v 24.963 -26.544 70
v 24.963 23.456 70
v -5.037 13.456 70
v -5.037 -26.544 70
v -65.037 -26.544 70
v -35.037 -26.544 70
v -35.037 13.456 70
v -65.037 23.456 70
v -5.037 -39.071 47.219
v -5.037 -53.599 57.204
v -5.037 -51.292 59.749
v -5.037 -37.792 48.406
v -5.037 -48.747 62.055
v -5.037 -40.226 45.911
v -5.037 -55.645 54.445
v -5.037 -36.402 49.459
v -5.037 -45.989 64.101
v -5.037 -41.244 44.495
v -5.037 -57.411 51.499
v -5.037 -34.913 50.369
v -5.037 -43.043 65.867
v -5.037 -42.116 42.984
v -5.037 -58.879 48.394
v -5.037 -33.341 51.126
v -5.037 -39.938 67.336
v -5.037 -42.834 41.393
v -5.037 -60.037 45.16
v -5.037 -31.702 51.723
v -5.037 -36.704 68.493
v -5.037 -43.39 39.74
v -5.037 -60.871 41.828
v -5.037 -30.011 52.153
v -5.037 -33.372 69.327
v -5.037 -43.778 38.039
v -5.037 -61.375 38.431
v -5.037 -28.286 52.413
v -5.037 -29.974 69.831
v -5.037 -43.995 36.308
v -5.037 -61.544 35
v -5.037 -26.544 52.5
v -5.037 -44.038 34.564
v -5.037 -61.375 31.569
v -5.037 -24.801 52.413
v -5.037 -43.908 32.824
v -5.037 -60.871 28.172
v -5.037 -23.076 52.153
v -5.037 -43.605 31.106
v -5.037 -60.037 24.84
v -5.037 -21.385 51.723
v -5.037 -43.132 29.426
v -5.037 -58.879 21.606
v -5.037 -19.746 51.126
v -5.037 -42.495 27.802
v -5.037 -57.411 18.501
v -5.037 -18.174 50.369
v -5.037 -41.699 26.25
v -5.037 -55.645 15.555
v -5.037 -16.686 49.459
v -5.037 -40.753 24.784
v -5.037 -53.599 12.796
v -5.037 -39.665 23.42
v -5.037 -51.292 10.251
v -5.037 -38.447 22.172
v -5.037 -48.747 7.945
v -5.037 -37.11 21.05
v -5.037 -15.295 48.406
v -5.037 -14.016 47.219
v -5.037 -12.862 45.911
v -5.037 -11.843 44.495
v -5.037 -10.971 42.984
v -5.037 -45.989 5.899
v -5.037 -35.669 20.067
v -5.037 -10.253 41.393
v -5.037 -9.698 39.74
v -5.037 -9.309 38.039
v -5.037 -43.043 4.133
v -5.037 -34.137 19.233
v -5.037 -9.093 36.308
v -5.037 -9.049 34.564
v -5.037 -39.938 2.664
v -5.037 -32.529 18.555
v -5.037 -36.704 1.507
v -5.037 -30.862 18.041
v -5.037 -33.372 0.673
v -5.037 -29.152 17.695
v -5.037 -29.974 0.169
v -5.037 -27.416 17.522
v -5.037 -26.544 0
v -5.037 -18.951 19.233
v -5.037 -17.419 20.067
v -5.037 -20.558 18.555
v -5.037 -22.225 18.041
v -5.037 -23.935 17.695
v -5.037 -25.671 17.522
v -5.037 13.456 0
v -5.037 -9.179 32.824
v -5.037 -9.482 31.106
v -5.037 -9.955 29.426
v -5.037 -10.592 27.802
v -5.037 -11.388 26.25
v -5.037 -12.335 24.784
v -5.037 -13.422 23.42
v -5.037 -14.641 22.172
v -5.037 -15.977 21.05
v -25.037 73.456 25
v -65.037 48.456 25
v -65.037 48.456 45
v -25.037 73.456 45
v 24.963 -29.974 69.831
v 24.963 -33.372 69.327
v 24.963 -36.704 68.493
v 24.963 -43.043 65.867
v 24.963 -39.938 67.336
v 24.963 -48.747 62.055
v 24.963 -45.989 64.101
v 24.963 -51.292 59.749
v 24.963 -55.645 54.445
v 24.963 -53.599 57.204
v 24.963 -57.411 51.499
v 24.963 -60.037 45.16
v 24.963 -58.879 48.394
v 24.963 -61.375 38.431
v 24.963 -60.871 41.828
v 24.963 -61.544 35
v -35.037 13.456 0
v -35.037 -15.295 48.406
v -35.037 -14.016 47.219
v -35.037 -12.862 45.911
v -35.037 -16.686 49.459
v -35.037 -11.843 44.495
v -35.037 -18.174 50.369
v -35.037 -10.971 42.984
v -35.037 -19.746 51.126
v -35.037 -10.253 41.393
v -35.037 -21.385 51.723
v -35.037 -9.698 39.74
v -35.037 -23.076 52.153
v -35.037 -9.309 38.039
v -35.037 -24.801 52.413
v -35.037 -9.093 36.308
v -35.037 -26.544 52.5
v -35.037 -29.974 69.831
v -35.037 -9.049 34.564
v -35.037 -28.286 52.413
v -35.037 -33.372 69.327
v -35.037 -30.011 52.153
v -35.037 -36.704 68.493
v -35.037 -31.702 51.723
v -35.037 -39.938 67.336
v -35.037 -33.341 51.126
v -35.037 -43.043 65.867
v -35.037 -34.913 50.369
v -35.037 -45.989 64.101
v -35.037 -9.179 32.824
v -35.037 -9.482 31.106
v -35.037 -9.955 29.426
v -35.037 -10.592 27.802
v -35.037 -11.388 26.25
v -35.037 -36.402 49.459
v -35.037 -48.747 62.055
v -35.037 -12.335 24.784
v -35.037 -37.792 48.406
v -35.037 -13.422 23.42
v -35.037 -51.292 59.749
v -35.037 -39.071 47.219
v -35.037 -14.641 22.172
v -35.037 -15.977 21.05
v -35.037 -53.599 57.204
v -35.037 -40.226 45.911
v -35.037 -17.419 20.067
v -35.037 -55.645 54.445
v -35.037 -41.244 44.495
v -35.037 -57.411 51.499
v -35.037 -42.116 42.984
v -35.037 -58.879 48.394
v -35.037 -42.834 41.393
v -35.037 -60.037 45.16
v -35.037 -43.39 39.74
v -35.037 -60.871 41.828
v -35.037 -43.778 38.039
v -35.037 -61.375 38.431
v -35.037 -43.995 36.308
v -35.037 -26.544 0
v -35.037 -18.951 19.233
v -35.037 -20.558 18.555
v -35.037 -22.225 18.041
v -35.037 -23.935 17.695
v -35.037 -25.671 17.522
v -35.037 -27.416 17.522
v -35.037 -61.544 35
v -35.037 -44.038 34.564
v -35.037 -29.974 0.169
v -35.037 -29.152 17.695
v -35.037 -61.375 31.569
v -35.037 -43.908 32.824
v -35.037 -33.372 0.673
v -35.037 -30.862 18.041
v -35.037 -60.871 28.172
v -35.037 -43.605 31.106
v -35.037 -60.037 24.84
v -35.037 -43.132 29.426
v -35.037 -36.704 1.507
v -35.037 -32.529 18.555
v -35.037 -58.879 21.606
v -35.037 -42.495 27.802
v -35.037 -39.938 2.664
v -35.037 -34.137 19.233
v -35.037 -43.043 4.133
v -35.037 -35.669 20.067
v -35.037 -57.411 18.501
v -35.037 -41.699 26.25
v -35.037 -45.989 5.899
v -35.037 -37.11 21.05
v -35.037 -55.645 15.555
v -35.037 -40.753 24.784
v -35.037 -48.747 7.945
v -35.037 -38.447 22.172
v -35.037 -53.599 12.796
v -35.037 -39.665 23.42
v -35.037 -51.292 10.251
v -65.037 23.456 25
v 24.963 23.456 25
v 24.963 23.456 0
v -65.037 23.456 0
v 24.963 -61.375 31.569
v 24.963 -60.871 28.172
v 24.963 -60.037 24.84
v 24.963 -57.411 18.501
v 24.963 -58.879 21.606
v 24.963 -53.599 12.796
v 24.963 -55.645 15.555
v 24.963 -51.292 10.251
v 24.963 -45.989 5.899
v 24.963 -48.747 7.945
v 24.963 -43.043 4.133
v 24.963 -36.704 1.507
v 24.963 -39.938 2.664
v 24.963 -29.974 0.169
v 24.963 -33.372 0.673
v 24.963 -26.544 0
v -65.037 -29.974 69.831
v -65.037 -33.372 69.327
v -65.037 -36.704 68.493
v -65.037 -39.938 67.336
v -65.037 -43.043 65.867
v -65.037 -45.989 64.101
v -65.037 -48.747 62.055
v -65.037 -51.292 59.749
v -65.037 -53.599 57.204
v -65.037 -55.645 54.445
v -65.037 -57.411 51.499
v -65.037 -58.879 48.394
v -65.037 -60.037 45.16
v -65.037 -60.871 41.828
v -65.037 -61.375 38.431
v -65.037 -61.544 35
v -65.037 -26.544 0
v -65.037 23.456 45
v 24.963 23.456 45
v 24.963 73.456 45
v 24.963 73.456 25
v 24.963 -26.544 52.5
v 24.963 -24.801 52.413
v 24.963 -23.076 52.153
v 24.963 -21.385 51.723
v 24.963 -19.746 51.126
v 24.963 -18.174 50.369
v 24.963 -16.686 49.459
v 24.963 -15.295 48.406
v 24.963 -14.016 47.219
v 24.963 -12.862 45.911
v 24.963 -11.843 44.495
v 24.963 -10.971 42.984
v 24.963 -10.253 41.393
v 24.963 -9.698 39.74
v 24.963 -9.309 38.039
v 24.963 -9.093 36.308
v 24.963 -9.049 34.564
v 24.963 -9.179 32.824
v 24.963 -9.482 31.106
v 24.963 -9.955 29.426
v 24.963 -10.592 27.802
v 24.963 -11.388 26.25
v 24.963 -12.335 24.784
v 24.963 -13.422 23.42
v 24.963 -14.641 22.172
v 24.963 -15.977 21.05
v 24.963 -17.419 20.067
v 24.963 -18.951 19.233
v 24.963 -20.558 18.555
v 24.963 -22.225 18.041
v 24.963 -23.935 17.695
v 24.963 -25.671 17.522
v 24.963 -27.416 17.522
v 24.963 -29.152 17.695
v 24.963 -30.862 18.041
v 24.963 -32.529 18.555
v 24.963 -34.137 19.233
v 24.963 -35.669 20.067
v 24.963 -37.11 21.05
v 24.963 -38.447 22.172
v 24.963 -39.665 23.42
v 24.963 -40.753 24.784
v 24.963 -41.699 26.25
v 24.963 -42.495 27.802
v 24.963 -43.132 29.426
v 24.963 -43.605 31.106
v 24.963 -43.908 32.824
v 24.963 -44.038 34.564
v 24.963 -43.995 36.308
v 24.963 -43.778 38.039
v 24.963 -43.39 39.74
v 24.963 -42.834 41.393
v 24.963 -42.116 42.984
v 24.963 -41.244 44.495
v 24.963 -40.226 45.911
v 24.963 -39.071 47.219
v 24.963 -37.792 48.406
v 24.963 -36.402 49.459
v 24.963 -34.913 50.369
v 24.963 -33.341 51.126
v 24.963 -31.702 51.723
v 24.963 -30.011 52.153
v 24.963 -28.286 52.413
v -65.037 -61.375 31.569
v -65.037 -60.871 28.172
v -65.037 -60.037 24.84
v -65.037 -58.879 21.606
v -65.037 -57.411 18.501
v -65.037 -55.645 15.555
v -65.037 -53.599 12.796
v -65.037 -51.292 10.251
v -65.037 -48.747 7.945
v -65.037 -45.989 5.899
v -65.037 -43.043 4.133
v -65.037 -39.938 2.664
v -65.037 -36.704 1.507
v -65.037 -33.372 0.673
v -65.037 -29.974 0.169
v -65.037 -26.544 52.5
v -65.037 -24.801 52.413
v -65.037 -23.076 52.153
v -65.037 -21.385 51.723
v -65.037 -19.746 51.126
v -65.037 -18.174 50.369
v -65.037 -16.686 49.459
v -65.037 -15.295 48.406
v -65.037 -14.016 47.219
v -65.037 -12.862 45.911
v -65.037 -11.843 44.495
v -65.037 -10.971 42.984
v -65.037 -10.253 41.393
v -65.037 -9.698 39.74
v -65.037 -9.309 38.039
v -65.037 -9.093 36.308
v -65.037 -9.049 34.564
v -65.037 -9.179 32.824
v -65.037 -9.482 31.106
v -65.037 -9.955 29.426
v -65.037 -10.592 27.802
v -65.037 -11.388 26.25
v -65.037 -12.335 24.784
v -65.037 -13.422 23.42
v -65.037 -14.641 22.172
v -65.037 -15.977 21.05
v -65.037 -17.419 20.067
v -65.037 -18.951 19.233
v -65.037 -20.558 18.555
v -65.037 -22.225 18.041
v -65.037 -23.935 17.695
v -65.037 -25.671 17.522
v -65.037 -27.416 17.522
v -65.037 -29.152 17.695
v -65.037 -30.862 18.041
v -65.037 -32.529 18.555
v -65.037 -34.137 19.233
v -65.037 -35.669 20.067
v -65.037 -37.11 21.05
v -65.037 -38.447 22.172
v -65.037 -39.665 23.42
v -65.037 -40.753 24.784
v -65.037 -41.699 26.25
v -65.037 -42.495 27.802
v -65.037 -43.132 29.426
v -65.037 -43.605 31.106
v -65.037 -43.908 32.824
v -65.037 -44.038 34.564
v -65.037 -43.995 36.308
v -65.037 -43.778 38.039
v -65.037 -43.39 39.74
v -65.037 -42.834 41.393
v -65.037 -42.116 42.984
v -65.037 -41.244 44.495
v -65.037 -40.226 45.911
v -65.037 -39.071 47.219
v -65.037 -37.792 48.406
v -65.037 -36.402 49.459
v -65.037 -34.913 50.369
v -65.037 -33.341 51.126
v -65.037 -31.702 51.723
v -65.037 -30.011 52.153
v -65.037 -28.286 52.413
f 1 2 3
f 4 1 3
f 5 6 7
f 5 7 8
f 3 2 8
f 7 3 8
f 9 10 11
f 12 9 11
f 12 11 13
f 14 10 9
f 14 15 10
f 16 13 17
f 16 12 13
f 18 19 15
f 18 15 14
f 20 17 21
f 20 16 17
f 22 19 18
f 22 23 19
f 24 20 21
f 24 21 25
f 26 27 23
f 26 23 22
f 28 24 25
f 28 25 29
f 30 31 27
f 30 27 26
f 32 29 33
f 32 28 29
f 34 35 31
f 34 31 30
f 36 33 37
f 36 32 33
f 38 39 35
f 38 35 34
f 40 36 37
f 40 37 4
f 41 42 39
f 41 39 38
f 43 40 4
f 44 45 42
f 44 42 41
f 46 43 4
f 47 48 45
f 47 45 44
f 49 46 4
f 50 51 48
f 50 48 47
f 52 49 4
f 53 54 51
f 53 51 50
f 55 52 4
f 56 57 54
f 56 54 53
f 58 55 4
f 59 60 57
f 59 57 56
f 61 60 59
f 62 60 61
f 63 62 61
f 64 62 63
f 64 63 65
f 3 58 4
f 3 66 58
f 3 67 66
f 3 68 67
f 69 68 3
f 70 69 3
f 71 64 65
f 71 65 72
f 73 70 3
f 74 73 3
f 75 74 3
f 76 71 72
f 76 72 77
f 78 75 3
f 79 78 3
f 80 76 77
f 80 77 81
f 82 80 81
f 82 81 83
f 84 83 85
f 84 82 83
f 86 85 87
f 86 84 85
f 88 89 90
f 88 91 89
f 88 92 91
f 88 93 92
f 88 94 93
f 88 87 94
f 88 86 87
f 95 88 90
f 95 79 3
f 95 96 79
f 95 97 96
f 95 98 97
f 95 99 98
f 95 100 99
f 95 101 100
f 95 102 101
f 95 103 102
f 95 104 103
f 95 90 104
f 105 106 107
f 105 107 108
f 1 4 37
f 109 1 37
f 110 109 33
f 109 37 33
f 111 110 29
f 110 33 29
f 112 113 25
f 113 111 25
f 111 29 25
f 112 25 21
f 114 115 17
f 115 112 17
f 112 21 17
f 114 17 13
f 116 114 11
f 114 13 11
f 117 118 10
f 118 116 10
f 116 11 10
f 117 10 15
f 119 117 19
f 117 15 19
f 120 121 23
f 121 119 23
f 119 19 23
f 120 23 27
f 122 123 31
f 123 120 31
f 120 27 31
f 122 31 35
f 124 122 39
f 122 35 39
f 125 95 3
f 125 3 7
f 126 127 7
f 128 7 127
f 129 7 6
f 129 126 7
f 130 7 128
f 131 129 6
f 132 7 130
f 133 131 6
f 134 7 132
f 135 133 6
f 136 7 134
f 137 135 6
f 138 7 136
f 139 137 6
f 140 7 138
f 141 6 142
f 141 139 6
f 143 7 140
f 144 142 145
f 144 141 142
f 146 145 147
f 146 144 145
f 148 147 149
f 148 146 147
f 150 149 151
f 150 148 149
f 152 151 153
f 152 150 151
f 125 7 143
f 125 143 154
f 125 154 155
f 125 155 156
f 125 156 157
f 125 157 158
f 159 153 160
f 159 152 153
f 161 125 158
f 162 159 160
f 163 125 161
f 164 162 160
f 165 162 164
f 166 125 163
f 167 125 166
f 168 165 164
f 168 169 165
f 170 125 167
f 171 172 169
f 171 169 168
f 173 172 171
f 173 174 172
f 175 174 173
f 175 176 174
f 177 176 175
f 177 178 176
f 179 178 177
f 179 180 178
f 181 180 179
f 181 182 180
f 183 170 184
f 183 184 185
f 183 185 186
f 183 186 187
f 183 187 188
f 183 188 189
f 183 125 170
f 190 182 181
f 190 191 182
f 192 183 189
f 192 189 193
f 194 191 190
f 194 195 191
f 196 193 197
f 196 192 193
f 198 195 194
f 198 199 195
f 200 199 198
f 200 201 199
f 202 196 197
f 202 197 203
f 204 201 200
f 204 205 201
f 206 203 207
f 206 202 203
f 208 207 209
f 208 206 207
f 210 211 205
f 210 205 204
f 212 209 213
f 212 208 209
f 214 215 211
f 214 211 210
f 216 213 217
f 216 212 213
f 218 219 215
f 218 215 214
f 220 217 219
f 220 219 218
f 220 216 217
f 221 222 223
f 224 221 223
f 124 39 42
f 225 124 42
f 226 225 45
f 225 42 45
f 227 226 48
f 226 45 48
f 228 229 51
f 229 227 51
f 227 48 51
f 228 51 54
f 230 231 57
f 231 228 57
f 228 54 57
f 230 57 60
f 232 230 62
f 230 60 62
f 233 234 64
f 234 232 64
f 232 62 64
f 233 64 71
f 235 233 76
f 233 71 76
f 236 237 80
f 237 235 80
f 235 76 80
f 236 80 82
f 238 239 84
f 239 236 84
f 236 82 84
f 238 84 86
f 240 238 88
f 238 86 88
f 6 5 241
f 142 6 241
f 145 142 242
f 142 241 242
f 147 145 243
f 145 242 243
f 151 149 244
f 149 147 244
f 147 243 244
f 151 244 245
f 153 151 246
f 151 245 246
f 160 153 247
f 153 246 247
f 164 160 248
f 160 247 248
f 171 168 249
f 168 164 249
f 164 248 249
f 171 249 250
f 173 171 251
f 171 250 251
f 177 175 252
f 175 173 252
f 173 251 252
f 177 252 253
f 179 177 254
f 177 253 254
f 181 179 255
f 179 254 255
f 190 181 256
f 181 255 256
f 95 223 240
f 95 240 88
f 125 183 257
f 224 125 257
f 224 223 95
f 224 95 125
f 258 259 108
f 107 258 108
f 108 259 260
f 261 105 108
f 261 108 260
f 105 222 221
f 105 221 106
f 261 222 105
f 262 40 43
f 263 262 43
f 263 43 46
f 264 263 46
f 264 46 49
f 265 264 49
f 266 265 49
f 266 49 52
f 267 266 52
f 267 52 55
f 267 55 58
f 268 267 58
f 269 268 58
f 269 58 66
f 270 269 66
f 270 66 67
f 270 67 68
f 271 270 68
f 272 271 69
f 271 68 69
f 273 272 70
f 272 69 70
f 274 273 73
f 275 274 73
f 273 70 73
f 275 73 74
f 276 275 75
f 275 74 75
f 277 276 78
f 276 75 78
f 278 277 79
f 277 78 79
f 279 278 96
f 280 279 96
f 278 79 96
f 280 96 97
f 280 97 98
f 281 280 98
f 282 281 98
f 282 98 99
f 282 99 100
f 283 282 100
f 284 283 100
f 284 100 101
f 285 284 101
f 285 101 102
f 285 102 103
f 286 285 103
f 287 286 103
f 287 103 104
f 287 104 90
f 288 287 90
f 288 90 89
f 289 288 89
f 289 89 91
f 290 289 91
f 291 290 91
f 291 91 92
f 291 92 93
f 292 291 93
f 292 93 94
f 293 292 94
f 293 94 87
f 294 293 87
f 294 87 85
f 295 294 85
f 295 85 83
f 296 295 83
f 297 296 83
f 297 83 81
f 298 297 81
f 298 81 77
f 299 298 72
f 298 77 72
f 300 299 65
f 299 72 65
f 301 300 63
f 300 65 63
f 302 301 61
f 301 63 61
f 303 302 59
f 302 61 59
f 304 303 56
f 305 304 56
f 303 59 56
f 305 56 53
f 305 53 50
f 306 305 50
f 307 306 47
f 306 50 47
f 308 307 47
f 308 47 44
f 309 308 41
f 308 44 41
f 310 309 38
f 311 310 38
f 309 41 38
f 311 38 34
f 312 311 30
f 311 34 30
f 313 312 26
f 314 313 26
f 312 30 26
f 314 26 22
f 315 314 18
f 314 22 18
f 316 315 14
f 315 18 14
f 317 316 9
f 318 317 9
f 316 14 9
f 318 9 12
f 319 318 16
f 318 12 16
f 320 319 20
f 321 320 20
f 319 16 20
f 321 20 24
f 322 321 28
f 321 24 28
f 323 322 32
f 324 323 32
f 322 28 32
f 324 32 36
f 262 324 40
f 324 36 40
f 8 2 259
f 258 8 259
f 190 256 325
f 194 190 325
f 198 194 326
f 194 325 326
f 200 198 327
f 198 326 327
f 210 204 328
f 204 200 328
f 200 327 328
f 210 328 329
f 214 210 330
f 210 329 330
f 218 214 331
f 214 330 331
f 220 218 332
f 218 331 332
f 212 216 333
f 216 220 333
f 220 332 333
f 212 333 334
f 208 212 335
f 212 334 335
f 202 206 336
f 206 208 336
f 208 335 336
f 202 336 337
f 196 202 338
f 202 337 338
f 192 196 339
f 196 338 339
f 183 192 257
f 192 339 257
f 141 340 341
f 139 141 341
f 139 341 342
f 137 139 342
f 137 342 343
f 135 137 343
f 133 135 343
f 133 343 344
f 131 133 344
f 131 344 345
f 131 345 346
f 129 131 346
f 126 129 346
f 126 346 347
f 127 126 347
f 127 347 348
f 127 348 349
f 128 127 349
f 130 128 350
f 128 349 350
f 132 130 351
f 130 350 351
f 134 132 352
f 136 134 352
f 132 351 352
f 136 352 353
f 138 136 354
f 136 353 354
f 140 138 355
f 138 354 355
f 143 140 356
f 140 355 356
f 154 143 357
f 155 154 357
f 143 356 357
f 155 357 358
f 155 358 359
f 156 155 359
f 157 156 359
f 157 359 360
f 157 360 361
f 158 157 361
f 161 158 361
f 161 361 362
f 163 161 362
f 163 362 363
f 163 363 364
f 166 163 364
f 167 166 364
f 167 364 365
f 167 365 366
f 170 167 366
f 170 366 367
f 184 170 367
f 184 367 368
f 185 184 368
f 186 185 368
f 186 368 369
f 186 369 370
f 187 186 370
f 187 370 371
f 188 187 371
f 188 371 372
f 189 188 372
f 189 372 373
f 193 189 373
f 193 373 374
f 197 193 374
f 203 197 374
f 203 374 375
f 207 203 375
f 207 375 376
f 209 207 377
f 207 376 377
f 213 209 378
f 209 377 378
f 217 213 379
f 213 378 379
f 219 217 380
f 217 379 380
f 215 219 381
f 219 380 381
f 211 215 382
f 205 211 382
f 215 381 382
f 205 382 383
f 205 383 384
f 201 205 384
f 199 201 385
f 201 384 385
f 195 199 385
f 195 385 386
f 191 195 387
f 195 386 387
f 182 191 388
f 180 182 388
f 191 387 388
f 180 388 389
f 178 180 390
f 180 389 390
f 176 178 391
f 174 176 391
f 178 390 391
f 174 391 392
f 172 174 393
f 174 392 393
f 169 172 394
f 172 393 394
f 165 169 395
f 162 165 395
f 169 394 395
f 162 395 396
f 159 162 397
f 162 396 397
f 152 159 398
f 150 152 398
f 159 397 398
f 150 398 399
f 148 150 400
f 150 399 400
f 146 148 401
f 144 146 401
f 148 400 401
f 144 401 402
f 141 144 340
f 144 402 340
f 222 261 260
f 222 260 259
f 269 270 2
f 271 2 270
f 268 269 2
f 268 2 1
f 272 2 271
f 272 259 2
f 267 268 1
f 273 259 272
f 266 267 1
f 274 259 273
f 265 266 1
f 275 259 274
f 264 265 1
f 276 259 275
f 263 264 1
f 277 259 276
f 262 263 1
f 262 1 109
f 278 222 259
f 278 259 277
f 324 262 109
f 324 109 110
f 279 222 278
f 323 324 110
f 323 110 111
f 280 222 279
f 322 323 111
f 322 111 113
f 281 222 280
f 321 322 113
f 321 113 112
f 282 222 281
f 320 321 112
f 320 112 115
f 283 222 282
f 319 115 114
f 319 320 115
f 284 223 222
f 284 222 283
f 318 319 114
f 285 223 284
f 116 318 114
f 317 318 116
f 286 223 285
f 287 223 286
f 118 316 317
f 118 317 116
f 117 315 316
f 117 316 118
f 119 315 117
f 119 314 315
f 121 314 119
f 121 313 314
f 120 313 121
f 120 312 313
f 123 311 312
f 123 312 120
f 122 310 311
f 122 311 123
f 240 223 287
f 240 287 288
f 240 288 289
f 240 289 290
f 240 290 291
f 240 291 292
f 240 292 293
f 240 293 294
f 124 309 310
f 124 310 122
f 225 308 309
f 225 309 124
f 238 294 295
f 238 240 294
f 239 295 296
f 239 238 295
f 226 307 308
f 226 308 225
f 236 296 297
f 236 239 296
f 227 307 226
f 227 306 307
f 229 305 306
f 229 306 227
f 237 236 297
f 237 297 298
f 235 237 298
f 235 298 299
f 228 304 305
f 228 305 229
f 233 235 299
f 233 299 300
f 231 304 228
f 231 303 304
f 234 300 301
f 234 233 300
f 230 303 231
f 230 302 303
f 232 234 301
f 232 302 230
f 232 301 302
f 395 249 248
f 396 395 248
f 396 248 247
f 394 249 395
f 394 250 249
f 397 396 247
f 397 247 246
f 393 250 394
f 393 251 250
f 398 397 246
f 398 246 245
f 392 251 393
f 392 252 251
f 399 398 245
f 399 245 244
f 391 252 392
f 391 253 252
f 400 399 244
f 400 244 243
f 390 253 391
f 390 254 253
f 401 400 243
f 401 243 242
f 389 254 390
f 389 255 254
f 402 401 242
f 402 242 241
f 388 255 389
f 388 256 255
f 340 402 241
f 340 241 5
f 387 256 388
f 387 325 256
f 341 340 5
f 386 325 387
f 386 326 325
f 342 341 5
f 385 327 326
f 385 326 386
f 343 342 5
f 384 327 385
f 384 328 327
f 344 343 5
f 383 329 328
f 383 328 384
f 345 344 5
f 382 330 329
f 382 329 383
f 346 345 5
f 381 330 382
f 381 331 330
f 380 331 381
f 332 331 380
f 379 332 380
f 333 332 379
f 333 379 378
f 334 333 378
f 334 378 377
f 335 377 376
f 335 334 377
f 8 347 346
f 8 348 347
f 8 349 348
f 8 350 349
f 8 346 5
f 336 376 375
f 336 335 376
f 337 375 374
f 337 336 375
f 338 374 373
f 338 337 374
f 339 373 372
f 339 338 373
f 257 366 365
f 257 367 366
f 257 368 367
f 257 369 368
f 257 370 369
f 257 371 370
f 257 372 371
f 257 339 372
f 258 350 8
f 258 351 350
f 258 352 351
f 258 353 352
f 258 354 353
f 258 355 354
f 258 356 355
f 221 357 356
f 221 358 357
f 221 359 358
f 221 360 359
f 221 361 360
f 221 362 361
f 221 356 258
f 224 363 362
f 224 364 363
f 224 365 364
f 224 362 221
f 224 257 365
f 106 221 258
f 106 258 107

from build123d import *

# Parameters (mm, degrees)
BOSS_EXTRUDE1_DEPTH = 70
SKETCH4_R           = 17.5
CUT_EXTRUDE3_DEPTH  = 137
SKETCH6_W           = 25
SKETCH6_H           = 50
CUT_EXTRUDE4_DEPTH  = 137
SKETCH7_W           = 25
SKETCH7_H           = 50
CUT_EXTRUDE5_DEPTH  = 137
CUT_EXTRUDE6_DEPTH  = 137


with BuildPart() as part:
    # Sketch3 → Boss-Extrude1 (new body)
    with BuildSketch(Plane.XY):
        Polygon((24.962893573, 73.456383547), (24.962893573, -61.543616453), (-5.037106427, -61.543616453), (-5.037106427, 13.456383547), (-35.037106427, 13.456383547), (-35.037106427, -61.543616453), (-65.037106427, -61.543616453), (-65.037106427, 48.456383547), (-25.037106427, 73.456383547), align=None)
    extrude(amount=BOSS_EXTRUDE1_DEPTH)

    # Sketch4 → Cut-Extrude3 (cut)
    with BuildSketch(Plane.ZY.offset(65.037106427)):
        with Locations((35, -26.543616453)):
            Circle(SKETCH4_R)
    extrude(amount=-CUT_EXTRUDE3_DEPTH, mode=Mode.SUBTRACT)

    # Sketch6 → Cut-Extrude4 (cut)
    with BuildSketch(Plane(origin=(24.962893573, 0, 0), x_dir=(0, 0, -1), z_dir=(1, 0, 0))):
        with Locations((-57.5, 48.456383547)):
            Rectangle(SKETCH6_W, SKETCH6_H)
    extrude(amount=-CUT_EXTRUDE4_DEPTH, mode=Mode.SUBTRACT)

    # Sketch7 → Cut-Extrude5 (cut)
    with BuildSketch(Plane(origin=(24.962893573, 0, 0), x_dir=(0, 0, -1), z_dir=(1, 0, 0))):
        with Locations((-12.5, 48.456383547)):
            Rectangle(SKETCH7_W, SKETCH7_H)
    extrude(amount=-CUT_EXTRUDE5_DEPTH, mode=Mode.SUBTRACT)

    # Sketch8 → Cut-Extrude6 (cut)
    with BuildSketch(Plane.ZY.offset(65.037106427)):
        with BuildLine():
            ThreePointArc((35, -61.543616453), (10.251262658, -51.292353794), (0, -26.543616453))
            Line((0, -26.543616453), (0, -61.543616453))
            Line((0, -61.543616453), (35, -61.543616453))
        make_face()
        with BuildLine():
            Line((70, -61.543616453), (70, -26.543616453))
            ThreePointArc((70, -26.543616453), (59.748737342, -51.292353794), (35, -61.543616453))
            Line((35, -61.543616453), (70, -61.543616453))
        make_face()
    extrude(amount=-CUT_EXTRUDE6_DEPTH, mode=Mode.SUBTRACT)


solid = part.part
